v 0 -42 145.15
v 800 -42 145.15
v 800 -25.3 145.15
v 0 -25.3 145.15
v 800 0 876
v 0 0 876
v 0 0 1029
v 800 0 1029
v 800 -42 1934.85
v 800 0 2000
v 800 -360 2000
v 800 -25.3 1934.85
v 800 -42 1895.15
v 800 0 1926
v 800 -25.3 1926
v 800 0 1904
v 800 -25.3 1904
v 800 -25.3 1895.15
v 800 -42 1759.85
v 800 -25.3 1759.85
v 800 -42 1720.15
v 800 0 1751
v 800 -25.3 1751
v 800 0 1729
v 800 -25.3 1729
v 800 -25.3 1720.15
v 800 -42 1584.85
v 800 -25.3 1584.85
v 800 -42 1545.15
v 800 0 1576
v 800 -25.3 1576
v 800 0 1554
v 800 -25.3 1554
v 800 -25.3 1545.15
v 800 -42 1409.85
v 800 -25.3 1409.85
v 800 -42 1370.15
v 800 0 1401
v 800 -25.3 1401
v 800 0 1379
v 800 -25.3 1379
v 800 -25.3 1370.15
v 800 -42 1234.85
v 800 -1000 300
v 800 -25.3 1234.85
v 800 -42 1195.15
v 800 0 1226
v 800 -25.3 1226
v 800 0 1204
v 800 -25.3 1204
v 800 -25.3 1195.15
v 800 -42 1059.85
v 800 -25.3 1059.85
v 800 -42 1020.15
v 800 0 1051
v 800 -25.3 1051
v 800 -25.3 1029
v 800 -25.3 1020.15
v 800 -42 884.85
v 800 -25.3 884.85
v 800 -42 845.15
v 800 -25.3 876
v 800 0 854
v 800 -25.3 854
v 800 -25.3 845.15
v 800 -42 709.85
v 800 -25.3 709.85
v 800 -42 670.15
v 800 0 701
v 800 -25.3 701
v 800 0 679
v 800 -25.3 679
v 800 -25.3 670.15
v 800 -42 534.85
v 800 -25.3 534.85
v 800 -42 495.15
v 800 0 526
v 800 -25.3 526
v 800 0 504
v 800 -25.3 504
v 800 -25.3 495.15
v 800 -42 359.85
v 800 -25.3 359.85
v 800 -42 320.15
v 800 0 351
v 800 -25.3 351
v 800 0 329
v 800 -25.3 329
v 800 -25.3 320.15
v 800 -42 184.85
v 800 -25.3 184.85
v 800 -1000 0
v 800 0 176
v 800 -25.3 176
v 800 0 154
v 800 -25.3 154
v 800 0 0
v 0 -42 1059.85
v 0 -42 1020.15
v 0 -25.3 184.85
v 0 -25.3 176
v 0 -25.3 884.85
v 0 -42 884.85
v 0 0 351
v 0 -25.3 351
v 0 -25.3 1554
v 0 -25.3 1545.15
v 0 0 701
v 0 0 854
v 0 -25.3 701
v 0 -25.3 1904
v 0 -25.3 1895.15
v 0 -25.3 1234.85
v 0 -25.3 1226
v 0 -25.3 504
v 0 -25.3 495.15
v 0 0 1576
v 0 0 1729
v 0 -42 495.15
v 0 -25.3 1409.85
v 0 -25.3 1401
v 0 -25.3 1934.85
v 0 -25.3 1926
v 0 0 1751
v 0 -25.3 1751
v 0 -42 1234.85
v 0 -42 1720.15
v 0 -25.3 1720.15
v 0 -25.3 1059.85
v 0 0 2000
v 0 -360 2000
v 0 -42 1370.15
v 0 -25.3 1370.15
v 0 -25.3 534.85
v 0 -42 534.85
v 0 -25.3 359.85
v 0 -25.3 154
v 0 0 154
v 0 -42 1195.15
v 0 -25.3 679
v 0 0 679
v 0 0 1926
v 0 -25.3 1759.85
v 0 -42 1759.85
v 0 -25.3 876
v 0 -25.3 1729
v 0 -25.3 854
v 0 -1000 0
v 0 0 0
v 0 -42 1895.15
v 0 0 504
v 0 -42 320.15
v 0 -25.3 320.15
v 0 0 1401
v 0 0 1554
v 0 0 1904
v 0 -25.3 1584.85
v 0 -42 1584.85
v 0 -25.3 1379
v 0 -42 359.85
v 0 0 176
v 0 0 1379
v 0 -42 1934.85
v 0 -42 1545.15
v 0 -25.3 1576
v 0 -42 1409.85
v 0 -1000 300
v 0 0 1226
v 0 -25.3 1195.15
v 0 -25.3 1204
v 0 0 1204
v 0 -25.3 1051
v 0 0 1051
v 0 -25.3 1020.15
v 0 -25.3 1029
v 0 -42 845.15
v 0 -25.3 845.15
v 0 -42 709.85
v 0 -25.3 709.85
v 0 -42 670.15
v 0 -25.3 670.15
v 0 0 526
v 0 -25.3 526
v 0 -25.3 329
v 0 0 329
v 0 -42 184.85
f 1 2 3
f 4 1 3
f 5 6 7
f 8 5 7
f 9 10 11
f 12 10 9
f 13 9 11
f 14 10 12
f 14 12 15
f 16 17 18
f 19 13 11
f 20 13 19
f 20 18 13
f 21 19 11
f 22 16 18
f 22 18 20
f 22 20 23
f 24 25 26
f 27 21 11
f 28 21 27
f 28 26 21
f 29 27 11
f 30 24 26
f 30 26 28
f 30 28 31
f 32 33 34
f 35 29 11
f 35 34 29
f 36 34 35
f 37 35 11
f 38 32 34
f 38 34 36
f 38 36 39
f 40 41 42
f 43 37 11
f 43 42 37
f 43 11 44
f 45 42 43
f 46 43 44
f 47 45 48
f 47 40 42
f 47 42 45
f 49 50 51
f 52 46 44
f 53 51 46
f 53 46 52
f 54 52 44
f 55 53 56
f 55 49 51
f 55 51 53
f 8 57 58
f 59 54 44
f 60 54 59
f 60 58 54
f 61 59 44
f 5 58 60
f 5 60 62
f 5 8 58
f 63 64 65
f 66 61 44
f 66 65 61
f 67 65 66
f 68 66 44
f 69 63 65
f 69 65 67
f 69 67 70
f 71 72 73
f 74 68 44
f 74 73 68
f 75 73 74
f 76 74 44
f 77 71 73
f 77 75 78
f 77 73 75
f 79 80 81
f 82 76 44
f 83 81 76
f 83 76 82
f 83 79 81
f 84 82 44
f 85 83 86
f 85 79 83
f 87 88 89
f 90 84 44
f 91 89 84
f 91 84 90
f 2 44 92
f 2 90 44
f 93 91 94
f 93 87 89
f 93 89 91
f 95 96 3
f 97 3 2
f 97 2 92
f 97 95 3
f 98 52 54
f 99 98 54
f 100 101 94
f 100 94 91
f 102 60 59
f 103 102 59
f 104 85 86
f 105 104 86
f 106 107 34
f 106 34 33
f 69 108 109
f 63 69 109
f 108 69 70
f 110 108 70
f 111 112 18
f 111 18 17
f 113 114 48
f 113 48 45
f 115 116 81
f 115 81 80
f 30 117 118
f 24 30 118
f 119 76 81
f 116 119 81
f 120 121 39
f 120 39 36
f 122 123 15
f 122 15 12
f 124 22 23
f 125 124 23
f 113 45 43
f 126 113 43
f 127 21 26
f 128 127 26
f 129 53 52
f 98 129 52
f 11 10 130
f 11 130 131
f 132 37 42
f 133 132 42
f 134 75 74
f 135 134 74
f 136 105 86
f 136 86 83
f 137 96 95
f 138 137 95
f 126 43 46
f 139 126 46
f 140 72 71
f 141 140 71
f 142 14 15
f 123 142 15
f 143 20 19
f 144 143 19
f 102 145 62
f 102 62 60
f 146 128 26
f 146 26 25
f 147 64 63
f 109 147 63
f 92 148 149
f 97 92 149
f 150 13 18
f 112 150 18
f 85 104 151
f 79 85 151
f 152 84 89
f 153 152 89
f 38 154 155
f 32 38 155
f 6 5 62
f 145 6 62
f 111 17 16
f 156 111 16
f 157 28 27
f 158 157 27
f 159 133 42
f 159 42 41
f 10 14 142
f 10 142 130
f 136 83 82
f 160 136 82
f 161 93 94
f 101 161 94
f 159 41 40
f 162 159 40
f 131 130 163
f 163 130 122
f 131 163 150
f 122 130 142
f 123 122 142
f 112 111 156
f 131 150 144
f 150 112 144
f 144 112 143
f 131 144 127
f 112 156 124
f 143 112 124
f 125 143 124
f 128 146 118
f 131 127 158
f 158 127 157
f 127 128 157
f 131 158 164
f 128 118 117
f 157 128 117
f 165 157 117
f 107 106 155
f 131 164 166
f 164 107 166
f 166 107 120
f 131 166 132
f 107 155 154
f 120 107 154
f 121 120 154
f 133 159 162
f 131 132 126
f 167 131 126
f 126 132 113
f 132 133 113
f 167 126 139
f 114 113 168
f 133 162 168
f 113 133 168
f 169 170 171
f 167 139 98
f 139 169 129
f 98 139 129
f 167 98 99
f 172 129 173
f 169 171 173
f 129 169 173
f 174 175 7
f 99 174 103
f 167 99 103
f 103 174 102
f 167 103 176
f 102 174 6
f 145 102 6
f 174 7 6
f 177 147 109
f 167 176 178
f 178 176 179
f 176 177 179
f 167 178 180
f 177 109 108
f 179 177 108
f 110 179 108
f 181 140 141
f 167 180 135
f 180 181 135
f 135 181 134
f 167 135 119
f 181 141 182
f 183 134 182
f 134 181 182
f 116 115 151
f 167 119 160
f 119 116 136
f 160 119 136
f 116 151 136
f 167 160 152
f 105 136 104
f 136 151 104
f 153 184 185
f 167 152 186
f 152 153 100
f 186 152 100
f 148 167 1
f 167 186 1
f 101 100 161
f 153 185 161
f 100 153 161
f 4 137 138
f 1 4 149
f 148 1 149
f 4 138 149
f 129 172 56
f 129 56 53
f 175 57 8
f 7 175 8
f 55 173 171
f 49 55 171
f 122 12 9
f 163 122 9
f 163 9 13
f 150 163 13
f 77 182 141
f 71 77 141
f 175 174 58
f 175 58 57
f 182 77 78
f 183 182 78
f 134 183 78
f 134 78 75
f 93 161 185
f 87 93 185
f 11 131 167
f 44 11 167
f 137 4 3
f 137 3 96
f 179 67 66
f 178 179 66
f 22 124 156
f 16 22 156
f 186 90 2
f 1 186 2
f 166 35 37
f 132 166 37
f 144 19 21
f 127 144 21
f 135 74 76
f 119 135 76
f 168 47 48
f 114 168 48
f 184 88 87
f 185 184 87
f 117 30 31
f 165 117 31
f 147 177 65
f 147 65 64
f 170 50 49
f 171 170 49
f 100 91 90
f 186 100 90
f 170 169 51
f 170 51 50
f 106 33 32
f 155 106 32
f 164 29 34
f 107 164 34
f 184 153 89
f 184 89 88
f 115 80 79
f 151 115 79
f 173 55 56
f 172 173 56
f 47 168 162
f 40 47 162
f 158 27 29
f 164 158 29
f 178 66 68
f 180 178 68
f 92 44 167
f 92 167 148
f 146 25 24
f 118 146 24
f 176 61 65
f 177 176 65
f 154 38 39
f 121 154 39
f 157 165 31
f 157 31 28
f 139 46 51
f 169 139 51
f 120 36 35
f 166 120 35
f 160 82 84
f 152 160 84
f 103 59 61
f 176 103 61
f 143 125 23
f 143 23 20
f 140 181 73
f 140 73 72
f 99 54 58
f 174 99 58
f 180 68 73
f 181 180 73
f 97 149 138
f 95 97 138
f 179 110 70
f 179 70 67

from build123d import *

# Parameters (mm, degrees)
BOSS_EXTRUDE1_DEPTH = 800
CUT_EXTRUDE1_REACH  = 2376.868
LPATTERN1_COUNT     = 11
LPATTERN1_PITCH     = 175


with BuildPart() as part:
    # Sketch4 → Boss-Extrude1 (new body)
    with BuildSketch(Plane(origin=(0, 0, 0), x_dir=(0, 0, -1), z_dir=(1, 0, 0))):
        Polygon((0, 0), (-2000, 0), (-2000, -360), (-300, -1000), (0, -1000), align=None)
    extrude(amount=BOSS_EXTRUDE1_DEPTH)

    # Sketch6 → Cut-Extrude1 (cut, up to next)
    with BuildSketch(Plane(origin=(0, 0, 0), x_dir=(0, 0, -1), z_dir=(1, 0, 0)), mode=Mode.PRIVATE) as cut_extrude1_sk1:
        Polygon((-154, 0), (-176, 0), (-176, -25.3), (-184.85, -25.3), (-184.85, -42), (-145.15, -42), (-145.15, -25.3), (-154, -25.3), align=None)
    cut_extrude1_tool1 = extrude(cut_extrude1_sk1.sketch, amount=CUT_EXTRUDE1_REACH, mode=Mode.PRIVATE) & part.part
    cut_extrude1 = cut_extrude1_tool1.solids().sort_by_distance((0, -24.065959, 165))[0]
    add(cut_extrude1, mode=Mode.SUBTRACT)

    # LPattern1: Cut-Extrude1 ×11
    with Locations(*[(0, 0, i * LPATTERN1_PITCH) for i in range(1, LPATTERN1_COUNT)]):
        add(cut_extrude1, mode=Mode.SUBTRACT)


solid = part.part
